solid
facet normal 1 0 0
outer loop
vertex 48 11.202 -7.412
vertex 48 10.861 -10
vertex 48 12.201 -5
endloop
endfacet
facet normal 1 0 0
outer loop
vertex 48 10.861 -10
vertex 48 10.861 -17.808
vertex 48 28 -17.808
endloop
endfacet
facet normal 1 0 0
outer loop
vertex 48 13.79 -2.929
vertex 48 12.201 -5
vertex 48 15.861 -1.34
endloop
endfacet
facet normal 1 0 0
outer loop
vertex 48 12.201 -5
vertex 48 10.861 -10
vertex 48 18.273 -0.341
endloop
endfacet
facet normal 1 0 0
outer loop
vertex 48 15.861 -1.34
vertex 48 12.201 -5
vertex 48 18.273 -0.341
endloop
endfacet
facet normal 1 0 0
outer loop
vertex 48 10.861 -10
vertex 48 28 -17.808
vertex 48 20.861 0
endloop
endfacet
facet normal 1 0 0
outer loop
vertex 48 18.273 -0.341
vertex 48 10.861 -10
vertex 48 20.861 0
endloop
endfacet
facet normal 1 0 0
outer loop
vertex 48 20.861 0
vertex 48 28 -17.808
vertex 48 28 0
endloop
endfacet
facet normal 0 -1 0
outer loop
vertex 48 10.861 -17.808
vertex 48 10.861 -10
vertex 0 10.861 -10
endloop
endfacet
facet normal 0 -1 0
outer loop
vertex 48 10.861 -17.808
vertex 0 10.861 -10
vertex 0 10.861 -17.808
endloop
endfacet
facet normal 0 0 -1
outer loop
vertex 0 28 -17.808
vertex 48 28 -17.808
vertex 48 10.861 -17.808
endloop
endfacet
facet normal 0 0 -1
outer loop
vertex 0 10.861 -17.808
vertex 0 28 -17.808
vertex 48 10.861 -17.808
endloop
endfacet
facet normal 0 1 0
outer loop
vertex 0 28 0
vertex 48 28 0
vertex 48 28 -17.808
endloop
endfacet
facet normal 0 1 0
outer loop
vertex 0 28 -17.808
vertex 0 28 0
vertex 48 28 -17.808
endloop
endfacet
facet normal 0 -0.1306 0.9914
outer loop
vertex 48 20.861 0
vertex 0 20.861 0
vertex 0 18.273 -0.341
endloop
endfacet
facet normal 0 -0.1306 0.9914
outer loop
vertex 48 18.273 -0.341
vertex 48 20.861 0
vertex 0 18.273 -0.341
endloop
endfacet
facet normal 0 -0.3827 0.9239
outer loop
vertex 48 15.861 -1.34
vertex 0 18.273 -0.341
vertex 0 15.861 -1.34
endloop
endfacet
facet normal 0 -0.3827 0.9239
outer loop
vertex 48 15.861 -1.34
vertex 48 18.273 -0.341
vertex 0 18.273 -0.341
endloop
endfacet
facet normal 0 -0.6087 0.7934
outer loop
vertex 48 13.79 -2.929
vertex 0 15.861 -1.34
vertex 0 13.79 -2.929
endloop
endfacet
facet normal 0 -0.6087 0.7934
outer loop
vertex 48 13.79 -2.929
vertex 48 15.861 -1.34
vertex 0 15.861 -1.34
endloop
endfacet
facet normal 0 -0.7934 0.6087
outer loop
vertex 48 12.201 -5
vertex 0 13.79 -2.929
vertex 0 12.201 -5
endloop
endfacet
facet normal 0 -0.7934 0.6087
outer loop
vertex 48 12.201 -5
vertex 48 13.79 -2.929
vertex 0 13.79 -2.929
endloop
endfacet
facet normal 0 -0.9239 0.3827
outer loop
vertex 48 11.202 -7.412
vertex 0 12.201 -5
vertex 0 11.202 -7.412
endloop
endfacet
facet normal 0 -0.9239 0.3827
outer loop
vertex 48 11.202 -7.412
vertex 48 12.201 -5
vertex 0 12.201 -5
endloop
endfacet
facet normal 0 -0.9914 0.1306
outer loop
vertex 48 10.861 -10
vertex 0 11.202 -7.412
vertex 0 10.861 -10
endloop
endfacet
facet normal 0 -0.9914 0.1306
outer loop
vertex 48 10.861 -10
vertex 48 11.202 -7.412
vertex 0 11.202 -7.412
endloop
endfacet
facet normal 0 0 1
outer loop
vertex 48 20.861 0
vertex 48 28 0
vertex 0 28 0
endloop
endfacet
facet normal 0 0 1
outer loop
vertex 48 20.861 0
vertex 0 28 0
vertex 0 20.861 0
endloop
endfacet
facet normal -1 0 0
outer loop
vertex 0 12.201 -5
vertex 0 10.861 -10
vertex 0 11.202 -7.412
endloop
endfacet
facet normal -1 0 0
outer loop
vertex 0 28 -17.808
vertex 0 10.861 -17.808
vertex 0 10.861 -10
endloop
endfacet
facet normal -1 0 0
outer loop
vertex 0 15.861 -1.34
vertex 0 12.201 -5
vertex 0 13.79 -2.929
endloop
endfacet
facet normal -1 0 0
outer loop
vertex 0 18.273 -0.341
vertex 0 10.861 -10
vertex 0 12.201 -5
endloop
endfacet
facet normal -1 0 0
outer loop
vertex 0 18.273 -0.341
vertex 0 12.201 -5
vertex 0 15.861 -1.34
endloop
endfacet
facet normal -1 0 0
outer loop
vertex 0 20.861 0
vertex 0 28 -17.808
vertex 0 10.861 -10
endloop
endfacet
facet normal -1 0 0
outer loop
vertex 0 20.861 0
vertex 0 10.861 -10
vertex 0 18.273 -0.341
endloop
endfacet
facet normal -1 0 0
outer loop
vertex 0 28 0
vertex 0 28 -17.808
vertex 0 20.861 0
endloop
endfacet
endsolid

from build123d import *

# Parameters (mm, degrees)
SKETCH1_W            = 48
SKETCH1_H            = 53
BOSS_EXTRUDE1_DEPTH  = 10
SKETCH2_W            = 48
SKETCH2_H            = 5.616325
BOSS_EXTRUDE2_DEPTH  = 33.1917878
SKETCH4_W            = 4
SKETCH4_H            = 10
BOSS_EXTRUDE4_DEPTH  = 40
SKETCH5_W            = 48
SKETCH5_H            = 10.8609375
BOSS_EXTRUDE5_DEPTH  = 23.1917878
SKETCH6_W            = 48
SKETCH6_H            = 5
BOSS_EXTRUDE6_DEPTH  = 42.3
SKETCH7_W            = 12.8082122
SKETCH7_H            = 16.4772625
BOSS_EXTRUDE7_DEPTH  = 48
CUT_EXTRUDE1_REACH   = 84.426
SKETCH8_R            = 11.5
SKETCH8_R_2          = 2
FILLET1_R            = 10
FILLET2_R            = 4
SKETCH9_W            = 5
SKETCH9_H            = 16.4772625
BOSS_EXTRUDE9_DEPTH  = 48
CUT_EXTRUDE2_DEPTH   = 6
SKETCH11_R           = 1.9304
CUT_EXTRUDE3_DEPTH   = 6
BOSS_EXTRUDE11_DEPTH = 3
BOSS_EXTRUDE12_DEPTH = 48
SKETCH14_W           = 119.824941969
SKETCH14_H           = 122.237524693
CUT_EXTRUDE4_DEPTH   = 90.10667764


with BuildPart() as part:
    # Sketch1 → Boss-Extrude1 (new body)
    with BuildSketch(Plane.XY):
        with Locations((24, 26.5)):
            Rectangle(SKETCH1_W, SKETCH1_H)
    extrude(amount=BOSS_EXTRUDE1_DEPTH)

    # Sketch2 → Boss-Extrude2 (add)
    with BuildSketch(Plane(origin=(0, 0, 0), x_dir=(-1, 0, 0), z_dir=(0, 0, -1))):
        with Locations((-24, -2.8081625)):
            Rectangle(SKETCH2_W, SKETCH2_H)
    extrude(amount=-BOSS_EXTRUDE2_DEPTH)

    # Sketch4 → Boss-Extrude4 (add)
    with BuildSketch(Plane.XY.offset(10)):
        with Locations((2, 48)):
            Rectangle(SKETCH4_W, SKETCH4_H)
        with Locations((46, 48)):
            Rectangle(SKETCH4_W, SKETCH4_H)
    extrude(amount=BOSS_EXTRUDE4_DEPTH)

    # Sketch5 → Boss-Extrude5 (add)
    with BuildSketch(Plane.XY.offset(10)):
        with Locations((24, 5.43046875)):
            Rectangle(SKETCH5_W, SKETCH5_H)
    extrude(amount=BOSS_EXTRUDE5_DEPTH)

    # Sketch6 → Boss-Extrude6 (add)
    with BuildSketch(Plane.XZ.offset(5.616325)):
        with Locations((24, 30.6917878)):
            Rectangle(SKETCH6_W, SKETCH6_H)
    extrude(amount=BOSS_EXTRUDE6_DEPTH)

    # Sketch7 → Boss-Extrude7 (add)
    with BuildSketch(Plane.ZY):
        with Locations((-6.4041061, 2.62230625)):
            Rectangle(SKETCH7_W, SKETCH7_H)
    extrude(amount=-BOSS_EXTRUDE7_DEPTH)

    # Sketch8 → Cut-Extrude1 (cut, up to next)
    with BuildSketch(Plane(origin=(0, 0, 28.1917878), x_dir=(-1, 0, 0), z_dir=(0, 0, -1)), mode=Mode.PRIVATE) as cut_extrude1_sk1:
        with Locations((-24, -26.616325)):
            Circle(SKETCH8_R)
    cut_extrude1_tool1 = extrude(cut_extrude1_sk1.sketch, amount=-CUT_EXTRUDE1_REACH, mode=Mode.PRIVATE) & part.part
    # Sketch8 → Cut-Extrude1 (cut, up to next)
    with BuildSketch(Plane(origin=(0, 0, 28.1917878), x_dir=(-1, 0, 0), z_dir=(0, 0, -1)), mode=Mode.PRIVATE) as cut_extrude1_sk2:
        with Locations((-39.5, -11.116325)):
            Circle(SKETCH8_R_2)
    cut_extrude1_tool2 = extrude(cut_extrude1_sk2.sketch, amount=-CUT_EXTRUDE1_REACH, mode=Mode.PRIVATE) & part.part
    # Sketch8 → Cut-Extrude1 (cut, up to next)
    with BuildSketch(Plane(origin=(0, 0, 28.1917878), x_dir=(-1, 0, 0), z_dir=(0, 0, -1)), mode=Mode.PRIVATE) as cut_extrude1_sk3:
        with Locations((-39.5, -42.116325)):
            Circle(SKETCH8_R_2)
    cut_extrude1_tool3 = extrude(cut_extrude1_sk3.sketch, amount=-CUT_EXTRUDE1_REACH, mode=Mode.PRIVATE) & part.part
    # Sketch8 → Cut-Extrude1 (cut, up to next)
    with BuildSketch(Plane(origin=(0, 0, 28.1917878), x_dir=(-1, 0, 0), z_dir=(0, 0, -1)), mode=Mode.PRIVATE) as cut_extrude1_sk4:
        with Locations((-8.5, -11.116325)):
            Circle(SKETCH8_R_2)
    cut_extrude1_tool4 = extrude(cut_extrude1_sk4.sketch, amount=-CUT_EXTRUDE1_REACH, mode=Mode.PRIVATE) & part.part
    # Sketch8 → Cut-Extrude1 (cut, up to next)
    with BuildSketch(Plane(origin=(0, 0, 28.1917878), x_dir=(-1, 0, 0), z_dir=(0, 0, -1)), mode=Mode.PRIVATE) as cut_extrude1_sk5:
        with Locations((-8.5, -42.116325)):
            Circle(SKETCH8_R_2)
    cut_extrude1_tool5 = extrude(cut_extrude1_sk5.sketch, amount=-CUT_EXTRUDE1_REACH, mode=Mode.PRIVATE) & part.part
    add(cut_extrude1_tool1.solids().sort_by_distance((24, -26.616325, 28.191788))[0], mode=Mode.SUBTRACT)
    add(cut_extrude1_tool2.solids().sort_by_distance((39.5, -11.116325, 28.191788))[0], mode=Mode.SUBTRACT)
    add(cut_extrude1_tool3.solids().sort_by_distance((39.5, -42.116325, 28.191788))[0], mode=Mode.SUBTRACT)
    add(cut_extrude1_tool4.solids().sort_by_distance((8.5, -11.116325, 28.191788))[0], mode=Mode.SUBTRACT)
    add(cut_extrude1_tool5.solids().sort_by_distance((8.5, -42.116325, 28.191788))[0], mode=Mode.SUBTRACT)

    # Fillet1
    fillet1_edges = [part.edges().sort_by_distance(p)[0] for p in [
        (24, 10.8609375, 0),
    ]]
    fillet(fillet1_edges, radius=FILLET1_R)

    # Fillet2
    fillet2_edges = [part.edges().sort_by_distance(p)[0] for p in [
        (2, 43, 10),
        (46, 43, 10),
    ]]
    fillet(fillet2_edges, radius=FILLET2_R)

    # Sketch9 → Boss-Extrude9 (add)
    with BuildSketch(Plane(origin=(48, 0, 0), x_dir=(0, 0, -1), z_dir=(1, 0, 0))):
        with Locations((15.3082122, 2.62230625)):
            Rectangle(SKETCH9_W, SKETCH9_H)
    extrude(amount=-BOSS_EXTRUDE9_DEPTH)

    # Sketch10 → Cut-Extrude2 (cut)
    with BuildSketch(Plane.XY.offset(10)):
        Polygon((12.429, 36.979734073), (9, 38.959468146), (5.571, 36.979734073), (5.571, 33.020265927), (9, 31.040531854), (12.429, 33.020265927), align=None)
        Polygon((35.571, 36.979734073), (35.571, 33.020265927), (39, 31.040531854), (42.429, 33.020265927), (42.429, 36.979734073), (39, 38.959468146), align=None)
    extrude(amount=-CUT_EXTRUDE2_DEPTH, mode=Mode.SUBTRACT)

    # Sketch11 → Cut-Extrude3 (cut)
    with BuildSketch(Plane.XY.offset(4)):
        with Locations((9, 35)):
            Circle(SKETCH11_R)
        with Locations((39, 35)):
            Circle(SKETCH11_R)
    extrude(amount=-CUT_EXTRUDE3_DEPTH, mode=Mode.SUBTRACT)

    # Sketch12 → Boss-Extrude11 (add)
    with BuildSketch(Plane(origin=(0, 53, 0), x_dir=(1, 0, 0), z_dir=(0, 1, 0))):
        Polygon((0, 0), (0, -50), (4, -50), (4, -10), (44, -10), (44, -50), (48, -50), (48, 0), align=None)
    extrude(amount=BOSS_EXTRUDE11_DEPTH)

    # Sketch13 → Boss-Extrude12 (add)
    with BuildSketch(Plane(origin=(48, 0, 0), x_dir=(0, 0, -1), z_dir=(1, 0, 0))):
        with BuildLine():
            Line((17.8082122, 10.8609375), (10, 10.8609375))
            ThreePointArc((10, 10.8609375), (2.928932188, 13.789869688), (0, 20.8609375))
            Line((0, 20.8609375), (0, 28))
            Line((0, 28), (17.8082122, 28))
            Line((17.8082122, 28), (17.8082122, 10.8609375))
        make_face()
    extrude(amount=-BOSS_EXTRUDE12_DEPTH)

    # Sketch14 → Cut-Extrude4 (cut, through all)
    with BuildSketch(Plane(origin=(48, 0, 0), x_dir=(0, 0, -1), z_dir=(1, 0, 0))):
        with Locations((-16.90365686, 8.216937598)):
            Rectangle(SKETCH14_W, SKETCH14_H)
        with BuildLine():
            Line((0, 28), (0, 20.8609375))
            ThreePointArc((0, 20.8609375), (2.928932188, 13.789869688), (10, 10.8609375))
            Line((10, 10.8609375), (17.8082122, 10.8609375))
            Line((17.8082122, 10.8609375), (17.8082122, 28))
            Line((17.8082122, 28), (0, 28))
        make_face(mode=Mode.SUBTRACT)
    extrude(amount=-CUT_EXTRUDE4_DEPTH, mode=Mode.SUBTRACT)


solid = part.part
